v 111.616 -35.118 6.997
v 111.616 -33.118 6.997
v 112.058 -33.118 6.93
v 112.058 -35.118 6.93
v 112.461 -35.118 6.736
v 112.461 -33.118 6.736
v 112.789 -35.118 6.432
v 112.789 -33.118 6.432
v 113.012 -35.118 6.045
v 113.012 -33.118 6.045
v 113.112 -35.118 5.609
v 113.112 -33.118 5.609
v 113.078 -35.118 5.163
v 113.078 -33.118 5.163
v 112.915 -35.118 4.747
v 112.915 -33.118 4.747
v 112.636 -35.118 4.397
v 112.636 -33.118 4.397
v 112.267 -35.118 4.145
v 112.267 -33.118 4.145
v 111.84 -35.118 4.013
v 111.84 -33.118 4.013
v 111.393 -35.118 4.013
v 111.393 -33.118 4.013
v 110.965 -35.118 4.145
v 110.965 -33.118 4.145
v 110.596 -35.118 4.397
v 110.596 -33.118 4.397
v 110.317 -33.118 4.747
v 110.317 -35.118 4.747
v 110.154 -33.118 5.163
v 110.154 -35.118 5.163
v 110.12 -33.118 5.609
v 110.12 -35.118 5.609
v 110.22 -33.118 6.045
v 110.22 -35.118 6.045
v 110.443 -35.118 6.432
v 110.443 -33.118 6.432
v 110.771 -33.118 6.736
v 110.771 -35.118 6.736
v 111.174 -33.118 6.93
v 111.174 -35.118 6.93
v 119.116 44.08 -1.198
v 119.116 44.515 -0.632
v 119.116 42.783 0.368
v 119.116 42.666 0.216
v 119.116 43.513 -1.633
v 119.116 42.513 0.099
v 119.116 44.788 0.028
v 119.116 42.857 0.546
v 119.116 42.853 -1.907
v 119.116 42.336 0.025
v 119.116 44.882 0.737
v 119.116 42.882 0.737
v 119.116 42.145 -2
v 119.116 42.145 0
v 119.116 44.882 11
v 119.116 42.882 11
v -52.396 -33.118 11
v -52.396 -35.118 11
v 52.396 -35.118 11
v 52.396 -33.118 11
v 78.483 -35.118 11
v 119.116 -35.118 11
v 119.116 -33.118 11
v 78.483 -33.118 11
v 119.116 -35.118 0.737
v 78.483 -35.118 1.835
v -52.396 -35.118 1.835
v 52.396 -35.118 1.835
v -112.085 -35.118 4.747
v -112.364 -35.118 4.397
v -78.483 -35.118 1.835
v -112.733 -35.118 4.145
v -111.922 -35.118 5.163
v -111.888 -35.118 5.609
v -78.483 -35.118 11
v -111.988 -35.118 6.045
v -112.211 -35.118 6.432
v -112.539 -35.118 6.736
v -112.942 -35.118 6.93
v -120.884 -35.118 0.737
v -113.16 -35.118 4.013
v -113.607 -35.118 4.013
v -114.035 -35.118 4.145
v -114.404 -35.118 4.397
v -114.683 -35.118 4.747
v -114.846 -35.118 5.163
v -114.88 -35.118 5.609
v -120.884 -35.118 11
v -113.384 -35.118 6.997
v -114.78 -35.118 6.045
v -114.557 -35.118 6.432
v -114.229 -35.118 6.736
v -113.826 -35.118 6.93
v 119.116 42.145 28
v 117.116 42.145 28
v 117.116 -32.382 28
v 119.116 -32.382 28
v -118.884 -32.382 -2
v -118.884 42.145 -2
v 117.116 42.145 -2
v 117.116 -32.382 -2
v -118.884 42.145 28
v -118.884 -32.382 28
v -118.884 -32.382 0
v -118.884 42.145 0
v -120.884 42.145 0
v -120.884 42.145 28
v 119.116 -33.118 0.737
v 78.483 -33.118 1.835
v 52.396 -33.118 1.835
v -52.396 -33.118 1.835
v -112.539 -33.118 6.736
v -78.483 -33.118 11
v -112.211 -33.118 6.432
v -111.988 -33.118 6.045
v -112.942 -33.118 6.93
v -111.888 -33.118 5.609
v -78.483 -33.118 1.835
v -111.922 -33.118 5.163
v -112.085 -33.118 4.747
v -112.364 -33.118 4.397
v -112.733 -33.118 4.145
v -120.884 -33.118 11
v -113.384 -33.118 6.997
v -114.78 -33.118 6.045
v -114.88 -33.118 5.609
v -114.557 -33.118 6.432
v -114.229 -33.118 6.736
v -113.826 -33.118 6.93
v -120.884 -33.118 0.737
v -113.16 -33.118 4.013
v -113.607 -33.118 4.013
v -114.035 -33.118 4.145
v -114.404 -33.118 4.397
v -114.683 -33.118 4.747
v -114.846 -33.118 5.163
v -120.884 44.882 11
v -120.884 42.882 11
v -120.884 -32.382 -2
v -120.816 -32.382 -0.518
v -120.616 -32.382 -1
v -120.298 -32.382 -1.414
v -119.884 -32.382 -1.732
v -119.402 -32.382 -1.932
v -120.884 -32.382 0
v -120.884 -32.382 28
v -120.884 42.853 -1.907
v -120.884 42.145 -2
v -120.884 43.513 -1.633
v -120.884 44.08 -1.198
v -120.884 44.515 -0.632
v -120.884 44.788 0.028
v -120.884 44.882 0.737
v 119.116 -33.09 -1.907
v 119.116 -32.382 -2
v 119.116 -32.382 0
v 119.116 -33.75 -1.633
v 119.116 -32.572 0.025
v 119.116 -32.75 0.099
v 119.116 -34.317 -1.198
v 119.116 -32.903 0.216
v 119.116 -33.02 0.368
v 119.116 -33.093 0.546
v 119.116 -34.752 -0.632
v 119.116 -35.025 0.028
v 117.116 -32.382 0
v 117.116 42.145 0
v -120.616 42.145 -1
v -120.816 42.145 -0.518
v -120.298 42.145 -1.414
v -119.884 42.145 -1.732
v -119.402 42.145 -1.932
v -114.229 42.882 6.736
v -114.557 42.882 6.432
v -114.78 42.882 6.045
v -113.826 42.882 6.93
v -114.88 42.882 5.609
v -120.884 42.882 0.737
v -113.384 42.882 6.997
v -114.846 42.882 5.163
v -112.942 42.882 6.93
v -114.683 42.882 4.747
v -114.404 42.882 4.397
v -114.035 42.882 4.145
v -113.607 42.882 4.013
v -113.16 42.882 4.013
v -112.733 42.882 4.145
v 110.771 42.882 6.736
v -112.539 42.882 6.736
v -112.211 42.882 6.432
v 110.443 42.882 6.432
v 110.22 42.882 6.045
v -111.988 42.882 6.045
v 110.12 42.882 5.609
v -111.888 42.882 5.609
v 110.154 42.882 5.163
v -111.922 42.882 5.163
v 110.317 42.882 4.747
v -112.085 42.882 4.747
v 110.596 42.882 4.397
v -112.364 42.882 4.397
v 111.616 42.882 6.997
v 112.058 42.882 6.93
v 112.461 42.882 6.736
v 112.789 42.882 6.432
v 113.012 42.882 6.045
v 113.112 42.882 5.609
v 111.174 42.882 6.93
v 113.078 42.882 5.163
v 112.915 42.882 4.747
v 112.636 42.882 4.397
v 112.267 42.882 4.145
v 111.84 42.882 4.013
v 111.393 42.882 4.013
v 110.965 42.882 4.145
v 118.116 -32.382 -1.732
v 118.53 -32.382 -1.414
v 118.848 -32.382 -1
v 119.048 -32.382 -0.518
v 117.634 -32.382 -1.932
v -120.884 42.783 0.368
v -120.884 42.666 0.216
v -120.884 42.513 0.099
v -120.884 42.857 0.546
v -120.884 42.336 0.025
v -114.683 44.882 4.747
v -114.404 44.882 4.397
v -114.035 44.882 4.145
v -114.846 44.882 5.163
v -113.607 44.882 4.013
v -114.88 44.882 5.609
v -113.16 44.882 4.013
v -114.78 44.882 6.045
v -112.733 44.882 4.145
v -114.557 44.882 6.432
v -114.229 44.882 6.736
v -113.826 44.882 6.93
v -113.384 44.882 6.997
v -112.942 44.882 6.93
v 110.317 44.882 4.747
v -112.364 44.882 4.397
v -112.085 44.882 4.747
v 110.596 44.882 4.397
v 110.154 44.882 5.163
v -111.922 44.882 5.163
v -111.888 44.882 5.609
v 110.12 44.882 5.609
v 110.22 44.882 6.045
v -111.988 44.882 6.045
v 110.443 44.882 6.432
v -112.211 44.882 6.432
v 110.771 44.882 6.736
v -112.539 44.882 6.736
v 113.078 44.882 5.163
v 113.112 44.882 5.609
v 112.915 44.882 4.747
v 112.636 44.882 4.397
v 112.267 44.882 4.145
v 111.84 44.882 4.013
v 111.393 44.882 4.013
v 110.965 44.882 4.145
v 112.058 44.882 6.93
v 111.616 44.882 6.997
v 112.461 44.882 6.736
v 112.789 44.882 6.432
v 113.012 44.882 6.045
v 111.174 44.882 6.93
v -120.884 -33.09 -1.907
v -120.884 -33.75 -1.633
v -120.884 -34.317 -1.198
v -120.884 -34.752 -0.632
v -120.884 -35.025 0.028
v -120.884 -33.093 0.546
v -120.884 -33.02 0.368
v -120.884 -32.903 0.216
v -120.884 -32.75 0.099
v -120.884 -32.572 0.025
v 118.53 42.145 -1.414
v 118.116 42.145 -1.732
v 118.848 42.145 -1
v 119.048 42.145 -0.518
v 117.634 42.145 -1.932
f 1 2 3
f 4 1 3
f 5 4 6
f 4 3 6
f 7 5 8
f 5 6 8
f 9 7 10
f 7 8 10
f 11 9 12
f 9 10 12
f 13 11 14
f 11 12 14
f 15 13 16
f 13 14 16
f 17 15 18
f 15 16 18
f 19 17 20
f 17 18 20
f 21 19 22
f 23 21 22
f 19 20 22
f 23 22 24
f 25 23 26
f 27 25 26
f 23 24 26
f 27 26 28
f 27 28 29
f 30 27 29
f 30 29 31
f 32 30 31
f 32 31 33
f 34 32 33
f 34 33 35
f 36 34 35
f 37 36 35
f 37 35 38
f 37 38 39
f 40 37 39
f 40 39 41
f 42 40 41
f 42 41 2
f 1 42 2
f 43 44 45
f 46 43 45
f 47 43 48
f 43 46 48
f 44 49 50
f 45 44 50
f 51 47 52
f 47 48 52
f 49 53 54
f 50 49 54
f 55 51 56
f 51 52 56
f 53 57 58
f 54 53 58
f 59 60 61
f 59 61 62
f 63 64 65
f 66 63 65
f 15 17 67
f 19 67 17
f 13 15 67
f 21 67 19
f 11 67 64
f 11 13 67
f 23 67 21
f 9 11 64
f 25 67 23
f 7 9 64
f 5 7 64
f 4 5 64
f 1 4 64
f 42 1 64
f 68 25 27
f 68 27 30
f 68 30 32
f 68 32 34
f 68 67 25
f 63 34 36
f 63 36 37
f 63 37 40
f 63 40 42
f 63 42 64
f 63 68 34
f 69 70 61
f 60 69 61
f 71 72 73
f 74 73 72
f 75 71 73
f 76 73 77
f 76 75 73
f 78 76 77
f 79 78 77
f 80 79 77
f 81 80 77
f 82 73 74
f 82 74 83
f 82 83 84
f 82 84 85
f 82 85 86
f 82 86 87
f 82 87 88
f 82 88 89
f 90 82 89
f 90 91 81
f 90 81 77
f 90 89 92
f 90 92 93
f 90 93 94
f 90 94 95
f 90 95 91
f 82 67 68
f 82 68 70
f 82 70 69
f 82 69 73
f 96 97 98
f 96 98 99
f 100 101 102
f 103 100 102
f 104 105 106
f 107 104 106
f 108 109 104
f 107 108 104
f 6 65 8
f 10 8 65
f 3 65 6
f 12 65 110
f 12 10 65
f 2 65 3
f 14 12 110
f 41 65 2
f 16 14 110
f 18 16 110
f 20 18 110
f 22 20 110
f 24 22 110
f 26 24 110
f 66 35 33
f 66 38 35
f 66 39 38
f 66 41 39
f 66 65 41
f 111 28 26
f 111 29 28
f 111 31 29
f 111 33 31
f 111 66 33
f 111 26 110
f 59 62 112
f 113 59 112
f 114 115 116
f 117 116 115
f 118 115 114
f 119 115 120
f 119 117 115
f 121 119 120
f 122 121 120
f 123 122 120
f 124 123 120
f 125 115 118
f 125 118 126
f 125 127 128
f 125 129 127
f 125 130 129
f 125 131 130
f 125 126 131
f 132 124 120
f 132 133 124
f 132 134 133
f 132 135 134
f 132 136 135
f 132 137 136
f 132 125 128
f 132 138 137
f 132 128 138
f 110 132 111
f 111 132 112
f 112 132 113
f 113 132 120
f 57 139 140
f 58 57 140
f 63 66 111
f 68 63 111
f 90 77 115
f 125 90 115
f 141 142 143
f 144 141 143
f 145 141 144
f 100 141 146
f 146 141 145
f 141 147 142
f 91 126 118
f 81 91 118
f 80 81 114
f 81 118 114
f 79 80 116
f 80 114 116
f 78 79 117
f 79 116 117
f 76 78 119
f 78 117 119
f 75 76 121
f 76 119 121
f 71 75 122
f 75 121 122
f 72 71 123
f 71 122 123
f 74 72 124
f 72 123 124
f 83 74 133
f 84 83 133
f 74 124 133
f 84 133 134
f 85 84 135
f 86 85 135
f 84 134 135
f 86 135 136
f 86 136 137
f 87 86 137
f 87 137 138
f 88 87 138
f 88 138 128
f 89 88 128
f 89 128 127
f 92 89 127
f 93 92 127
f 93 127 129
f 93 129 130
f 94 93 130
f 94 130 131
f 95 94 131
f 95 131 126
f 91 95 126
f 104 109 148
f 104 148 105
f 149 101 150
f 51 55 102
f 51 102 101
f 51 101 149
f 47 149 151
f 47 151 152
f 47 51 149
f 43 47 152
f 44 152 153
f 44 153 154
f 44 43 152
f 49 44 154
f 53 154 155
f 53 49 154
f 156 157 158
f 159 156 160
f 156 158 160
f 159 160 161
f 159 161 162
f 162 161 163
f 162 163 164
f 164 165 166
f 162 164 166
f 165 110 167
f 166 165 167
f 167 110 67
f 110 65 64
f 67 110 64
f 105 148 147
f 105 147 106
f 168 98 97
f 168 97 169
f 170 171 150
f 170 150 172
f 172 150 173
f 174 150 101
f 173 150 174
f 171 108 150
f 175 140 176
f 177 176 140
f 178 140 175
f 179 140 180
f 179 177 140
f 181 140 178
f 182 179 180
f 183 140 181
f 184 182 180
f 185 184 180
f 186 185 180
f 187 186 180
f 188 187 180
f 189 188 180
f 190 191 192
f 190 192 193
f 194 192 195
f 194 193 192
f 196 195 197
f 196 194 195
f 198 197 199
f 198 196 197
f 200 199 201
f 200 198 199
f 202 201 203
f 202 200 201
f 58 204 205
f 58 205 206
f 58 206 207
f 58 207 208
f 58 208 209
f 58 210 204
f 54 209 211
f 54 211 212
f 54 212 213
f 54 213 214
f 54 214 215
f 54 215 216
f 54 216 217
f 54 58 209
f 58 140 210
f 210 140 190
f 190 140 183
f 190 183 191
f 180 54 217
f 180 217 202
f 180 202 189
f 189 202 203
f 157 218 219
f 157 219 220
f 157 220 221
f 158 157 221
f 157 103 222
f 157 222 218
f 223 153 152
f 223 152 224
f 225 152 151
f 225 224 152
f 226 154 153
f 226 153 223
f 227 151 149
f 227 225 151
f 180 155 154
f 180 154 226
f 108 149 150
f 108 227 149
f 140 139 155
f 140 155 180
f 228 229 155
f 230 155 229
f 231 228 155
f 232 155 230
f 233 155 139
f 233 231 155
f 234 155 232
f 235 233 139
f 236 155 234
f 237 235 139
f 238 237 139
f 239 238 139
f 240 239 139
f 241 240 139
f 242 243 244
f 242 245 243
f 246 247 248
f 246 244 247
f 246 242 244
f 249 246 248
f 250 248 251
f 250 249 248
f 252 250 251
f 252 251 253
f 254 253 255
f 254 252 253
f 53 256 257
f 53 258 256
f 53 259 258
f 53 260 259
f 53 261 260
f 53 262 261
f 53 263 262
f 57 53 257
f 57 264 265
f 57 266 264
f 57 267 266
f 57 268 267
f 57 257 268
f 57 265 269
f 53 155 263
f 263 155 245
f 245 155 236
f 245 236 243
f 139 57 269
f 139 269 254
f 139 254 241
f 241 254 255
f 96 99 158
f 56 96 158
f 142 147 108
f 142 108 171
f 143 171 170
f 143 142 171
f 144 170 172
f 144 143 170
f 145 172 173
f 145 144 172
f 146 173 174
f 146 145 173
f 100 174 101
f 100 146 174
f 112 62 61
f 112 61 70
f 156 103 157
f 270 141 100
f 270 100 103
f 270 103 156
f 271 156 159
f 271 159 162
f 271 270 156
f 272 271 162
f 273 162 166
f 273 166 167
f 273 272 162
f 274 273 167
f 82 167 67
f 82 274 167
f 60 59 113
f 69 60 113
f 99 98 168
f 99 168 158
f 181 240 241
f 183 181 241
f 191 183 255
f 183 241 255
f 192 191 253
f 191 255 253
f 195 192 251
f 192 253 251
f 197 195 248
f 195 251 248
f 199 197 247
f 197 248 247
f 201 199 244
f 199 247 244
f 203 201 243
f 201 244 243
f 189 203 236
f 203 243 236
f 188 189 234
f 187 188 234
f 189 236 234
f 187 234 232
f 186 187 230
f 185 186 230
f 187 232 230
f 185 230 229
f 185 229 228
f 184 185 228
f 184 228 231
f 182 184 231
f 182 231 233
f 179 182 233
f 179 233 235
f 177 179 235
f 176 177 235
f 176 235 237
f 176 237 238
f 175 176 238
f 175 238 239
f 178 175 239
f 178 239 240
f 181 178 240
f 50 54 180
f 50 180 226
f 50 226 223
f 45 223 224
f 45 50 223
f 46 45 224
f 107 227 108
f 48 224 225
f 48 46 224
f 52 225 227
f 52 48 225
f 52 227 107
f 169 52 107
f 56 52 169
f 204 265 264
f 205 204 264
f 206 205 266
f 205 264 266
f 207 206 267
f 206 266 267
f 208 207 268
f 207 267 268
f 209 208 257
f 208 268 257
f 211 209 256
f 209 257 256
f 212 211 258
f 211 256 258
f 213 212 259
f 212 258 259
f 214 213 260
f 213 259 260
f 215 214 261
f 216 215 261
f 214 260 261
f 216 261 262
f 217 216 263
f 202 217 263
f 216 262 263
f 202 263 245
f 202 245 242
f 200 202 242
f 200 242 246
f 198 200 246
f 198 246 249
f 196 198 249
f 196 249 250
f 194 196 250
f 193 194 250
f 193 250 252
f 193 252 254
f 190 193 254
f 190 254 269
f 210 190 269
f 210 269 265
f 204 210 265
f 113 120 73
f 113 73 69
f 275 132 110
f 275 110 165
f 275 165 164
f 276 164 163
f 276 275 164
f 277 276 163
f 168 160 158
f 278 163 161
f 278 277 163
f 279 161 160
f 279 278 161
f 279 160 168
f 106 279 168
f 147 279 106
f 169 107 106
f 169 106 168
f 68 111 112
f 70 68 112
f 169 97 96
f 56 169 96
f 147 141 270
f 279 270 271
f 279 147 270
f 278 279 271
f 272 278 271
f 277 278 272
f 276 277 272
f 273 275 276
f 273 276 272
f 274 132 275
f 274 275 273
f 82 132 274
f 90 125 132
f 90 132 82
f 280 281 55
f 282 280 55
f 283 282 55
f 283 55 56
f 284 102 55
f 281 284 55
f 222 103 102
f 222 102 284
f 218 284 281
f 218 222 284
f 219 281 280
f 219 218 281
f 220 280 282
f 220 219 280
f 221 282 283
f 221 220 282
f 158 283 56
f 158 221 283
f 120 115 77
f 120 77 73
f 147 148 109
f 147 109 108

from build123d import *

# Parameters (mm, degrees)
SKETCH31_W                     = 240
SKETCH31_H                     = 80
BASE_FLANGE1_DEPTH             = 2
EDGE_FLANGE1_STRIP_W           = 9.4732
EDGE_FLANGE1_STRIP_H           = 2
EDGE_FLANGE1_STRIP_CUT_DEPTH   = 240
EDGE_FLANGE1_STRIP_2_W         = 9.4732
EDGE_FLANGE1_STRIP_2_H         = 2
EDGE_FLANGE1_STRIP_CUT_2_DEPTH = 240
EDGE_FLANGE1_DEPTH             = 240
EDGE_FLANGE1_BEND_DEPTH        = 240
EDGE_FLANGE2_START             = -32.381792537
EDGE_FLANGE2_DEPTH             = 74.5268
EDGE_FLANGE2_2_OUTLINE_W       = 2
EDGE_FLANGE2_2_OUTLINE_H       = 28
EDGE_FLANGE2_2_DEPTH           = 74.5268
SKETCH52_W                     = 26.086706926
SKETCH52_H                     = 9.115658902
CUT_EXTRUDE2_DEPTH             = 10
SKETCH53_W                     = 26.086706926
SKETCH53_H                     = 0.049167759
CUT_EXTRUDE3_DEPTH             = 10
SKETCH61_R                     = 1.5
CUT_EXTRUDE8_DEPTH             = 148.637805464
SKETCH62_R                     = 1.5
CUT_EXTRUDE9_DEPTH             = 148.637805464


# Read off the part's stored shape, not the designer's step: Edge-Flange2
# Sheet-metal steps are written as plain solids
with BuildPart() as part:
    # Sketch31 → Base-Flange1 (new body)
    with BuildSketch(Plane.XY):
        with Locations((-0.883917881, 4.881607463)):
            Rectangle(SKETCH31_W, SKETCH31_H)
    extrude(amount=-BASE_FLANGE1_DEPTH)

    # Edge-Flange1 strip (across the edge) → Edge-Flange1 strip cut (cut)
    with BuildSketch(Plane(origin=(119.116082119, 44.881607463, 0), x_dir=(0, -1, 0), z_dir=(-1, 0, 0))):
        with Locations((-2, -1)):
            Rectangle(EDGE_FLANGE1_STRIP_W, EDGE_FLANGE1_STRIP_H)
    extrude(amount=EDGE_FLANGE1_STRIP_CUT_DEPTH, mode=Mode.SUBTRACT)

    # Edge-Flange1 strip 2 (across the edge) → Edge-Flange1 strip cut 2 (cut)
    with BuildSketch(Plane(origin=(-120.883917881, -35.118392537, 0), x_dir=(0, 1, 0), z_dir=(1, 0, 0))):
        with Locations((-2, -1)):
            Rectangle(EDGE_FLANGE1_STRIP_2_W, EDGE_FLANGE1_STRIP_2_H)
    extrude(amount=EDGE_FLANGE1_STRIP_CUT_2_DEPTH, mode=Mode.SUBTRACT)

    # Edge-Flange1 section (across the edge) → Edge-Flange1 (add)
    with BuildSketch(Plane(origin=(119.116082119, 44.881607463, 0), x_dir=(0, -1, 0), z_dir=(-1, 0, 0))):
        with BuildLine():
            Line((0, 0.7366), (0, 11))
            Line((0, 11), (2, 11))
            Line((2, 11), (2, 0.7366))
            ThreePointArc((2, 0.7366), (2.215745145, 0.215745145), (2.7366, 0))
            Line((2.7366, 0), (2.7366, -2))
            ThreePointArc((2.7366, -2), (0.801531583, -1.198468417), (0, 0.7366))
        make_face()
    extrude(amount=EDGE_FLANGE1_DEPTH)

    # Edge-Flange1 section 2 (across the edge) → Edge-Flange1 bend (add)
    with BuildSketch(Plane(origin=(-120.883917881, -35.118392537, 0), x_dir=(0, 1, 0), z_dir=(1, 0, 0))):
        with BuildLine():
            Line((0, 0.7366), (0, 11))
            Line((0, 11), (2, 11))
            Line((2, 11), (2, 0.7366))
            ThreePointArc((2, 0.7366), (2.215745145, 0.215745145), (2.7366, 0))
            Line((2.7366, 0), (2.7366, -2))
            ThreePointArc((2.7366, -2), (0.801531583, -1.198468417), (0, 0.7366))
        make_face()
    extrude(amount=EDGE_FLANGE1_BEND_DEPTH)

    # Edge-Flange2 outline → Edge-Flange2 (cut)
    with BuildSketch(Plane(origin=(0, 0, 0), x_dir=(1, 0, 0), z_dir=(0, 1, 0)).offset(EDGE_FLANGE2_START)):
        with BuildLine():
            ThreePointArc((117.116082119, 2), (118.530295681, 1.414213562), (119.116082119, 0))
            Line((119.116082119, 0), (119.116082119, 2))
            Line((119.116082119, 2), (117.116082119, 2))
        make_face()
        with BuildLine():
            ThreePointArc((-120.883917881, 0), (-120.298131443, 1.414213562), (-118.883917881, 2))
            Line((-118.883917881, 2), (-120.883917881, 2))
            Line((-120.883917881, 2), (-120.883917881, 0))
        make_face()
    extrude(amount=EDGE_FLANGE2_DEPTH, mode=Mode.SUBTRACT)

    # Edge-Flange2 2 outline → Edge-Flange2 2 (add)
    with BuildSketch(Plane(origin=(0, 0, 0), x_dir=(1, 0, 0), z_dir=(0, 1, 0)).offset(EDGE_FLANGE2_START)):
        with Locations((118.116082119, -14)):
            Rectangle(EDGE_FLANGE2_2_OUTLINE_W, EDGE_FLANGE2_2_OUTLINE_H)
        with Locations((-119.883917881, -14)):
            Rectangle(EDGE_FLANGE2_2_OUTLINE_W, EDGE_FLANGE2_2_OUTLINE_H)
    extrude(amount=EDGE_FLANGE2_2_DEPTH)

    # Sketch52 → Cut-Extrude2 (cut)
    with BuildSketch(Plane(origin=(0, -33.118392537, 0), x_dir=(1, 0, 0), z_dir=(0, 1, 0))):
        with Locations((-65.439575559, -6.39300279)):
            Rectangle(SKETCH52_W, SKETCH52_H)
    cut_extrude2 = extrude(amount=-CUT_EXTRUDE2_DEPTH, mode=Mode.SUBTRACT)

    # Sketch53 → Cut-Extrude3 (cut)
    with BuildSketch(Plane(origin=(0, -33.118392537, 0), x_dir=(1, 0, 0), z_dir=(0, 1, 0))):
        with Locations((-65.439575559, -10.975416121)):
            Rectangle(SKETCH53_W, SKETCH53_H)
    cut_extrude3 = extrude(amount=-CUT_EXTRUDE3_DEPTH, mode=Mode.SUBTRACT)

    # Mirror3: Cut-Extrude3 across plane
    add(cut_extrude3.mirror(Plane(origin=(0, 0, 0), x_dir=(0, 0, 1), z_dir=(1, 0, 0))), mode=Mode.SUBTRACT)

    # Mirror4: Cut-Extrude2, Cut-Extrude3 across plane
    add(cut_extrude2.mirror(Plane(origin=(0, 0, 0), x_dir=(0, 0, 1), z_dir=(1, 0, 0))), mode=Mode.SUBTRACT)
    add(cut_extrude3.mirror(Plane(origin=(0, 0, 0), x_dir=(0, 0, 1), z_dir=(1, 0, 0))), mode=Mode.SUBTRACT)

    # Sketch61 → Cut-Extrude8 (cut, through all)
    with BuildSketch(Plane(origin=(0, 44.881607463, 0), x_dir=(1, 0, 0), z_dir=(0, 1, 0))):
        with Locations(Location((111.616082119, -5.4966, 0), (0, 0, 270))):
            Circle(SKETCH61_R)
    extrude(amount=-CUT_EXTRUDE8_DEPTH, mode=Mode.SUBTRACT)

    # Sketch62 → Cut-Extrude9 (cut, through all)
    with BuildSketch(Plane(origin=(0, 44.881607463, 0), x_dir=(1, 0, 0), z_dir=(0, 1, 0))):
        with Locations(Location((-113.383917881, -5.4966, 0), (0, 0, 270))):
            Circle(SKETCH62_R)
    extrude(amount=-CUT_EXTRUDE9_DEPTH, mode=Mode.SUBTRACT)


solid = part.part
